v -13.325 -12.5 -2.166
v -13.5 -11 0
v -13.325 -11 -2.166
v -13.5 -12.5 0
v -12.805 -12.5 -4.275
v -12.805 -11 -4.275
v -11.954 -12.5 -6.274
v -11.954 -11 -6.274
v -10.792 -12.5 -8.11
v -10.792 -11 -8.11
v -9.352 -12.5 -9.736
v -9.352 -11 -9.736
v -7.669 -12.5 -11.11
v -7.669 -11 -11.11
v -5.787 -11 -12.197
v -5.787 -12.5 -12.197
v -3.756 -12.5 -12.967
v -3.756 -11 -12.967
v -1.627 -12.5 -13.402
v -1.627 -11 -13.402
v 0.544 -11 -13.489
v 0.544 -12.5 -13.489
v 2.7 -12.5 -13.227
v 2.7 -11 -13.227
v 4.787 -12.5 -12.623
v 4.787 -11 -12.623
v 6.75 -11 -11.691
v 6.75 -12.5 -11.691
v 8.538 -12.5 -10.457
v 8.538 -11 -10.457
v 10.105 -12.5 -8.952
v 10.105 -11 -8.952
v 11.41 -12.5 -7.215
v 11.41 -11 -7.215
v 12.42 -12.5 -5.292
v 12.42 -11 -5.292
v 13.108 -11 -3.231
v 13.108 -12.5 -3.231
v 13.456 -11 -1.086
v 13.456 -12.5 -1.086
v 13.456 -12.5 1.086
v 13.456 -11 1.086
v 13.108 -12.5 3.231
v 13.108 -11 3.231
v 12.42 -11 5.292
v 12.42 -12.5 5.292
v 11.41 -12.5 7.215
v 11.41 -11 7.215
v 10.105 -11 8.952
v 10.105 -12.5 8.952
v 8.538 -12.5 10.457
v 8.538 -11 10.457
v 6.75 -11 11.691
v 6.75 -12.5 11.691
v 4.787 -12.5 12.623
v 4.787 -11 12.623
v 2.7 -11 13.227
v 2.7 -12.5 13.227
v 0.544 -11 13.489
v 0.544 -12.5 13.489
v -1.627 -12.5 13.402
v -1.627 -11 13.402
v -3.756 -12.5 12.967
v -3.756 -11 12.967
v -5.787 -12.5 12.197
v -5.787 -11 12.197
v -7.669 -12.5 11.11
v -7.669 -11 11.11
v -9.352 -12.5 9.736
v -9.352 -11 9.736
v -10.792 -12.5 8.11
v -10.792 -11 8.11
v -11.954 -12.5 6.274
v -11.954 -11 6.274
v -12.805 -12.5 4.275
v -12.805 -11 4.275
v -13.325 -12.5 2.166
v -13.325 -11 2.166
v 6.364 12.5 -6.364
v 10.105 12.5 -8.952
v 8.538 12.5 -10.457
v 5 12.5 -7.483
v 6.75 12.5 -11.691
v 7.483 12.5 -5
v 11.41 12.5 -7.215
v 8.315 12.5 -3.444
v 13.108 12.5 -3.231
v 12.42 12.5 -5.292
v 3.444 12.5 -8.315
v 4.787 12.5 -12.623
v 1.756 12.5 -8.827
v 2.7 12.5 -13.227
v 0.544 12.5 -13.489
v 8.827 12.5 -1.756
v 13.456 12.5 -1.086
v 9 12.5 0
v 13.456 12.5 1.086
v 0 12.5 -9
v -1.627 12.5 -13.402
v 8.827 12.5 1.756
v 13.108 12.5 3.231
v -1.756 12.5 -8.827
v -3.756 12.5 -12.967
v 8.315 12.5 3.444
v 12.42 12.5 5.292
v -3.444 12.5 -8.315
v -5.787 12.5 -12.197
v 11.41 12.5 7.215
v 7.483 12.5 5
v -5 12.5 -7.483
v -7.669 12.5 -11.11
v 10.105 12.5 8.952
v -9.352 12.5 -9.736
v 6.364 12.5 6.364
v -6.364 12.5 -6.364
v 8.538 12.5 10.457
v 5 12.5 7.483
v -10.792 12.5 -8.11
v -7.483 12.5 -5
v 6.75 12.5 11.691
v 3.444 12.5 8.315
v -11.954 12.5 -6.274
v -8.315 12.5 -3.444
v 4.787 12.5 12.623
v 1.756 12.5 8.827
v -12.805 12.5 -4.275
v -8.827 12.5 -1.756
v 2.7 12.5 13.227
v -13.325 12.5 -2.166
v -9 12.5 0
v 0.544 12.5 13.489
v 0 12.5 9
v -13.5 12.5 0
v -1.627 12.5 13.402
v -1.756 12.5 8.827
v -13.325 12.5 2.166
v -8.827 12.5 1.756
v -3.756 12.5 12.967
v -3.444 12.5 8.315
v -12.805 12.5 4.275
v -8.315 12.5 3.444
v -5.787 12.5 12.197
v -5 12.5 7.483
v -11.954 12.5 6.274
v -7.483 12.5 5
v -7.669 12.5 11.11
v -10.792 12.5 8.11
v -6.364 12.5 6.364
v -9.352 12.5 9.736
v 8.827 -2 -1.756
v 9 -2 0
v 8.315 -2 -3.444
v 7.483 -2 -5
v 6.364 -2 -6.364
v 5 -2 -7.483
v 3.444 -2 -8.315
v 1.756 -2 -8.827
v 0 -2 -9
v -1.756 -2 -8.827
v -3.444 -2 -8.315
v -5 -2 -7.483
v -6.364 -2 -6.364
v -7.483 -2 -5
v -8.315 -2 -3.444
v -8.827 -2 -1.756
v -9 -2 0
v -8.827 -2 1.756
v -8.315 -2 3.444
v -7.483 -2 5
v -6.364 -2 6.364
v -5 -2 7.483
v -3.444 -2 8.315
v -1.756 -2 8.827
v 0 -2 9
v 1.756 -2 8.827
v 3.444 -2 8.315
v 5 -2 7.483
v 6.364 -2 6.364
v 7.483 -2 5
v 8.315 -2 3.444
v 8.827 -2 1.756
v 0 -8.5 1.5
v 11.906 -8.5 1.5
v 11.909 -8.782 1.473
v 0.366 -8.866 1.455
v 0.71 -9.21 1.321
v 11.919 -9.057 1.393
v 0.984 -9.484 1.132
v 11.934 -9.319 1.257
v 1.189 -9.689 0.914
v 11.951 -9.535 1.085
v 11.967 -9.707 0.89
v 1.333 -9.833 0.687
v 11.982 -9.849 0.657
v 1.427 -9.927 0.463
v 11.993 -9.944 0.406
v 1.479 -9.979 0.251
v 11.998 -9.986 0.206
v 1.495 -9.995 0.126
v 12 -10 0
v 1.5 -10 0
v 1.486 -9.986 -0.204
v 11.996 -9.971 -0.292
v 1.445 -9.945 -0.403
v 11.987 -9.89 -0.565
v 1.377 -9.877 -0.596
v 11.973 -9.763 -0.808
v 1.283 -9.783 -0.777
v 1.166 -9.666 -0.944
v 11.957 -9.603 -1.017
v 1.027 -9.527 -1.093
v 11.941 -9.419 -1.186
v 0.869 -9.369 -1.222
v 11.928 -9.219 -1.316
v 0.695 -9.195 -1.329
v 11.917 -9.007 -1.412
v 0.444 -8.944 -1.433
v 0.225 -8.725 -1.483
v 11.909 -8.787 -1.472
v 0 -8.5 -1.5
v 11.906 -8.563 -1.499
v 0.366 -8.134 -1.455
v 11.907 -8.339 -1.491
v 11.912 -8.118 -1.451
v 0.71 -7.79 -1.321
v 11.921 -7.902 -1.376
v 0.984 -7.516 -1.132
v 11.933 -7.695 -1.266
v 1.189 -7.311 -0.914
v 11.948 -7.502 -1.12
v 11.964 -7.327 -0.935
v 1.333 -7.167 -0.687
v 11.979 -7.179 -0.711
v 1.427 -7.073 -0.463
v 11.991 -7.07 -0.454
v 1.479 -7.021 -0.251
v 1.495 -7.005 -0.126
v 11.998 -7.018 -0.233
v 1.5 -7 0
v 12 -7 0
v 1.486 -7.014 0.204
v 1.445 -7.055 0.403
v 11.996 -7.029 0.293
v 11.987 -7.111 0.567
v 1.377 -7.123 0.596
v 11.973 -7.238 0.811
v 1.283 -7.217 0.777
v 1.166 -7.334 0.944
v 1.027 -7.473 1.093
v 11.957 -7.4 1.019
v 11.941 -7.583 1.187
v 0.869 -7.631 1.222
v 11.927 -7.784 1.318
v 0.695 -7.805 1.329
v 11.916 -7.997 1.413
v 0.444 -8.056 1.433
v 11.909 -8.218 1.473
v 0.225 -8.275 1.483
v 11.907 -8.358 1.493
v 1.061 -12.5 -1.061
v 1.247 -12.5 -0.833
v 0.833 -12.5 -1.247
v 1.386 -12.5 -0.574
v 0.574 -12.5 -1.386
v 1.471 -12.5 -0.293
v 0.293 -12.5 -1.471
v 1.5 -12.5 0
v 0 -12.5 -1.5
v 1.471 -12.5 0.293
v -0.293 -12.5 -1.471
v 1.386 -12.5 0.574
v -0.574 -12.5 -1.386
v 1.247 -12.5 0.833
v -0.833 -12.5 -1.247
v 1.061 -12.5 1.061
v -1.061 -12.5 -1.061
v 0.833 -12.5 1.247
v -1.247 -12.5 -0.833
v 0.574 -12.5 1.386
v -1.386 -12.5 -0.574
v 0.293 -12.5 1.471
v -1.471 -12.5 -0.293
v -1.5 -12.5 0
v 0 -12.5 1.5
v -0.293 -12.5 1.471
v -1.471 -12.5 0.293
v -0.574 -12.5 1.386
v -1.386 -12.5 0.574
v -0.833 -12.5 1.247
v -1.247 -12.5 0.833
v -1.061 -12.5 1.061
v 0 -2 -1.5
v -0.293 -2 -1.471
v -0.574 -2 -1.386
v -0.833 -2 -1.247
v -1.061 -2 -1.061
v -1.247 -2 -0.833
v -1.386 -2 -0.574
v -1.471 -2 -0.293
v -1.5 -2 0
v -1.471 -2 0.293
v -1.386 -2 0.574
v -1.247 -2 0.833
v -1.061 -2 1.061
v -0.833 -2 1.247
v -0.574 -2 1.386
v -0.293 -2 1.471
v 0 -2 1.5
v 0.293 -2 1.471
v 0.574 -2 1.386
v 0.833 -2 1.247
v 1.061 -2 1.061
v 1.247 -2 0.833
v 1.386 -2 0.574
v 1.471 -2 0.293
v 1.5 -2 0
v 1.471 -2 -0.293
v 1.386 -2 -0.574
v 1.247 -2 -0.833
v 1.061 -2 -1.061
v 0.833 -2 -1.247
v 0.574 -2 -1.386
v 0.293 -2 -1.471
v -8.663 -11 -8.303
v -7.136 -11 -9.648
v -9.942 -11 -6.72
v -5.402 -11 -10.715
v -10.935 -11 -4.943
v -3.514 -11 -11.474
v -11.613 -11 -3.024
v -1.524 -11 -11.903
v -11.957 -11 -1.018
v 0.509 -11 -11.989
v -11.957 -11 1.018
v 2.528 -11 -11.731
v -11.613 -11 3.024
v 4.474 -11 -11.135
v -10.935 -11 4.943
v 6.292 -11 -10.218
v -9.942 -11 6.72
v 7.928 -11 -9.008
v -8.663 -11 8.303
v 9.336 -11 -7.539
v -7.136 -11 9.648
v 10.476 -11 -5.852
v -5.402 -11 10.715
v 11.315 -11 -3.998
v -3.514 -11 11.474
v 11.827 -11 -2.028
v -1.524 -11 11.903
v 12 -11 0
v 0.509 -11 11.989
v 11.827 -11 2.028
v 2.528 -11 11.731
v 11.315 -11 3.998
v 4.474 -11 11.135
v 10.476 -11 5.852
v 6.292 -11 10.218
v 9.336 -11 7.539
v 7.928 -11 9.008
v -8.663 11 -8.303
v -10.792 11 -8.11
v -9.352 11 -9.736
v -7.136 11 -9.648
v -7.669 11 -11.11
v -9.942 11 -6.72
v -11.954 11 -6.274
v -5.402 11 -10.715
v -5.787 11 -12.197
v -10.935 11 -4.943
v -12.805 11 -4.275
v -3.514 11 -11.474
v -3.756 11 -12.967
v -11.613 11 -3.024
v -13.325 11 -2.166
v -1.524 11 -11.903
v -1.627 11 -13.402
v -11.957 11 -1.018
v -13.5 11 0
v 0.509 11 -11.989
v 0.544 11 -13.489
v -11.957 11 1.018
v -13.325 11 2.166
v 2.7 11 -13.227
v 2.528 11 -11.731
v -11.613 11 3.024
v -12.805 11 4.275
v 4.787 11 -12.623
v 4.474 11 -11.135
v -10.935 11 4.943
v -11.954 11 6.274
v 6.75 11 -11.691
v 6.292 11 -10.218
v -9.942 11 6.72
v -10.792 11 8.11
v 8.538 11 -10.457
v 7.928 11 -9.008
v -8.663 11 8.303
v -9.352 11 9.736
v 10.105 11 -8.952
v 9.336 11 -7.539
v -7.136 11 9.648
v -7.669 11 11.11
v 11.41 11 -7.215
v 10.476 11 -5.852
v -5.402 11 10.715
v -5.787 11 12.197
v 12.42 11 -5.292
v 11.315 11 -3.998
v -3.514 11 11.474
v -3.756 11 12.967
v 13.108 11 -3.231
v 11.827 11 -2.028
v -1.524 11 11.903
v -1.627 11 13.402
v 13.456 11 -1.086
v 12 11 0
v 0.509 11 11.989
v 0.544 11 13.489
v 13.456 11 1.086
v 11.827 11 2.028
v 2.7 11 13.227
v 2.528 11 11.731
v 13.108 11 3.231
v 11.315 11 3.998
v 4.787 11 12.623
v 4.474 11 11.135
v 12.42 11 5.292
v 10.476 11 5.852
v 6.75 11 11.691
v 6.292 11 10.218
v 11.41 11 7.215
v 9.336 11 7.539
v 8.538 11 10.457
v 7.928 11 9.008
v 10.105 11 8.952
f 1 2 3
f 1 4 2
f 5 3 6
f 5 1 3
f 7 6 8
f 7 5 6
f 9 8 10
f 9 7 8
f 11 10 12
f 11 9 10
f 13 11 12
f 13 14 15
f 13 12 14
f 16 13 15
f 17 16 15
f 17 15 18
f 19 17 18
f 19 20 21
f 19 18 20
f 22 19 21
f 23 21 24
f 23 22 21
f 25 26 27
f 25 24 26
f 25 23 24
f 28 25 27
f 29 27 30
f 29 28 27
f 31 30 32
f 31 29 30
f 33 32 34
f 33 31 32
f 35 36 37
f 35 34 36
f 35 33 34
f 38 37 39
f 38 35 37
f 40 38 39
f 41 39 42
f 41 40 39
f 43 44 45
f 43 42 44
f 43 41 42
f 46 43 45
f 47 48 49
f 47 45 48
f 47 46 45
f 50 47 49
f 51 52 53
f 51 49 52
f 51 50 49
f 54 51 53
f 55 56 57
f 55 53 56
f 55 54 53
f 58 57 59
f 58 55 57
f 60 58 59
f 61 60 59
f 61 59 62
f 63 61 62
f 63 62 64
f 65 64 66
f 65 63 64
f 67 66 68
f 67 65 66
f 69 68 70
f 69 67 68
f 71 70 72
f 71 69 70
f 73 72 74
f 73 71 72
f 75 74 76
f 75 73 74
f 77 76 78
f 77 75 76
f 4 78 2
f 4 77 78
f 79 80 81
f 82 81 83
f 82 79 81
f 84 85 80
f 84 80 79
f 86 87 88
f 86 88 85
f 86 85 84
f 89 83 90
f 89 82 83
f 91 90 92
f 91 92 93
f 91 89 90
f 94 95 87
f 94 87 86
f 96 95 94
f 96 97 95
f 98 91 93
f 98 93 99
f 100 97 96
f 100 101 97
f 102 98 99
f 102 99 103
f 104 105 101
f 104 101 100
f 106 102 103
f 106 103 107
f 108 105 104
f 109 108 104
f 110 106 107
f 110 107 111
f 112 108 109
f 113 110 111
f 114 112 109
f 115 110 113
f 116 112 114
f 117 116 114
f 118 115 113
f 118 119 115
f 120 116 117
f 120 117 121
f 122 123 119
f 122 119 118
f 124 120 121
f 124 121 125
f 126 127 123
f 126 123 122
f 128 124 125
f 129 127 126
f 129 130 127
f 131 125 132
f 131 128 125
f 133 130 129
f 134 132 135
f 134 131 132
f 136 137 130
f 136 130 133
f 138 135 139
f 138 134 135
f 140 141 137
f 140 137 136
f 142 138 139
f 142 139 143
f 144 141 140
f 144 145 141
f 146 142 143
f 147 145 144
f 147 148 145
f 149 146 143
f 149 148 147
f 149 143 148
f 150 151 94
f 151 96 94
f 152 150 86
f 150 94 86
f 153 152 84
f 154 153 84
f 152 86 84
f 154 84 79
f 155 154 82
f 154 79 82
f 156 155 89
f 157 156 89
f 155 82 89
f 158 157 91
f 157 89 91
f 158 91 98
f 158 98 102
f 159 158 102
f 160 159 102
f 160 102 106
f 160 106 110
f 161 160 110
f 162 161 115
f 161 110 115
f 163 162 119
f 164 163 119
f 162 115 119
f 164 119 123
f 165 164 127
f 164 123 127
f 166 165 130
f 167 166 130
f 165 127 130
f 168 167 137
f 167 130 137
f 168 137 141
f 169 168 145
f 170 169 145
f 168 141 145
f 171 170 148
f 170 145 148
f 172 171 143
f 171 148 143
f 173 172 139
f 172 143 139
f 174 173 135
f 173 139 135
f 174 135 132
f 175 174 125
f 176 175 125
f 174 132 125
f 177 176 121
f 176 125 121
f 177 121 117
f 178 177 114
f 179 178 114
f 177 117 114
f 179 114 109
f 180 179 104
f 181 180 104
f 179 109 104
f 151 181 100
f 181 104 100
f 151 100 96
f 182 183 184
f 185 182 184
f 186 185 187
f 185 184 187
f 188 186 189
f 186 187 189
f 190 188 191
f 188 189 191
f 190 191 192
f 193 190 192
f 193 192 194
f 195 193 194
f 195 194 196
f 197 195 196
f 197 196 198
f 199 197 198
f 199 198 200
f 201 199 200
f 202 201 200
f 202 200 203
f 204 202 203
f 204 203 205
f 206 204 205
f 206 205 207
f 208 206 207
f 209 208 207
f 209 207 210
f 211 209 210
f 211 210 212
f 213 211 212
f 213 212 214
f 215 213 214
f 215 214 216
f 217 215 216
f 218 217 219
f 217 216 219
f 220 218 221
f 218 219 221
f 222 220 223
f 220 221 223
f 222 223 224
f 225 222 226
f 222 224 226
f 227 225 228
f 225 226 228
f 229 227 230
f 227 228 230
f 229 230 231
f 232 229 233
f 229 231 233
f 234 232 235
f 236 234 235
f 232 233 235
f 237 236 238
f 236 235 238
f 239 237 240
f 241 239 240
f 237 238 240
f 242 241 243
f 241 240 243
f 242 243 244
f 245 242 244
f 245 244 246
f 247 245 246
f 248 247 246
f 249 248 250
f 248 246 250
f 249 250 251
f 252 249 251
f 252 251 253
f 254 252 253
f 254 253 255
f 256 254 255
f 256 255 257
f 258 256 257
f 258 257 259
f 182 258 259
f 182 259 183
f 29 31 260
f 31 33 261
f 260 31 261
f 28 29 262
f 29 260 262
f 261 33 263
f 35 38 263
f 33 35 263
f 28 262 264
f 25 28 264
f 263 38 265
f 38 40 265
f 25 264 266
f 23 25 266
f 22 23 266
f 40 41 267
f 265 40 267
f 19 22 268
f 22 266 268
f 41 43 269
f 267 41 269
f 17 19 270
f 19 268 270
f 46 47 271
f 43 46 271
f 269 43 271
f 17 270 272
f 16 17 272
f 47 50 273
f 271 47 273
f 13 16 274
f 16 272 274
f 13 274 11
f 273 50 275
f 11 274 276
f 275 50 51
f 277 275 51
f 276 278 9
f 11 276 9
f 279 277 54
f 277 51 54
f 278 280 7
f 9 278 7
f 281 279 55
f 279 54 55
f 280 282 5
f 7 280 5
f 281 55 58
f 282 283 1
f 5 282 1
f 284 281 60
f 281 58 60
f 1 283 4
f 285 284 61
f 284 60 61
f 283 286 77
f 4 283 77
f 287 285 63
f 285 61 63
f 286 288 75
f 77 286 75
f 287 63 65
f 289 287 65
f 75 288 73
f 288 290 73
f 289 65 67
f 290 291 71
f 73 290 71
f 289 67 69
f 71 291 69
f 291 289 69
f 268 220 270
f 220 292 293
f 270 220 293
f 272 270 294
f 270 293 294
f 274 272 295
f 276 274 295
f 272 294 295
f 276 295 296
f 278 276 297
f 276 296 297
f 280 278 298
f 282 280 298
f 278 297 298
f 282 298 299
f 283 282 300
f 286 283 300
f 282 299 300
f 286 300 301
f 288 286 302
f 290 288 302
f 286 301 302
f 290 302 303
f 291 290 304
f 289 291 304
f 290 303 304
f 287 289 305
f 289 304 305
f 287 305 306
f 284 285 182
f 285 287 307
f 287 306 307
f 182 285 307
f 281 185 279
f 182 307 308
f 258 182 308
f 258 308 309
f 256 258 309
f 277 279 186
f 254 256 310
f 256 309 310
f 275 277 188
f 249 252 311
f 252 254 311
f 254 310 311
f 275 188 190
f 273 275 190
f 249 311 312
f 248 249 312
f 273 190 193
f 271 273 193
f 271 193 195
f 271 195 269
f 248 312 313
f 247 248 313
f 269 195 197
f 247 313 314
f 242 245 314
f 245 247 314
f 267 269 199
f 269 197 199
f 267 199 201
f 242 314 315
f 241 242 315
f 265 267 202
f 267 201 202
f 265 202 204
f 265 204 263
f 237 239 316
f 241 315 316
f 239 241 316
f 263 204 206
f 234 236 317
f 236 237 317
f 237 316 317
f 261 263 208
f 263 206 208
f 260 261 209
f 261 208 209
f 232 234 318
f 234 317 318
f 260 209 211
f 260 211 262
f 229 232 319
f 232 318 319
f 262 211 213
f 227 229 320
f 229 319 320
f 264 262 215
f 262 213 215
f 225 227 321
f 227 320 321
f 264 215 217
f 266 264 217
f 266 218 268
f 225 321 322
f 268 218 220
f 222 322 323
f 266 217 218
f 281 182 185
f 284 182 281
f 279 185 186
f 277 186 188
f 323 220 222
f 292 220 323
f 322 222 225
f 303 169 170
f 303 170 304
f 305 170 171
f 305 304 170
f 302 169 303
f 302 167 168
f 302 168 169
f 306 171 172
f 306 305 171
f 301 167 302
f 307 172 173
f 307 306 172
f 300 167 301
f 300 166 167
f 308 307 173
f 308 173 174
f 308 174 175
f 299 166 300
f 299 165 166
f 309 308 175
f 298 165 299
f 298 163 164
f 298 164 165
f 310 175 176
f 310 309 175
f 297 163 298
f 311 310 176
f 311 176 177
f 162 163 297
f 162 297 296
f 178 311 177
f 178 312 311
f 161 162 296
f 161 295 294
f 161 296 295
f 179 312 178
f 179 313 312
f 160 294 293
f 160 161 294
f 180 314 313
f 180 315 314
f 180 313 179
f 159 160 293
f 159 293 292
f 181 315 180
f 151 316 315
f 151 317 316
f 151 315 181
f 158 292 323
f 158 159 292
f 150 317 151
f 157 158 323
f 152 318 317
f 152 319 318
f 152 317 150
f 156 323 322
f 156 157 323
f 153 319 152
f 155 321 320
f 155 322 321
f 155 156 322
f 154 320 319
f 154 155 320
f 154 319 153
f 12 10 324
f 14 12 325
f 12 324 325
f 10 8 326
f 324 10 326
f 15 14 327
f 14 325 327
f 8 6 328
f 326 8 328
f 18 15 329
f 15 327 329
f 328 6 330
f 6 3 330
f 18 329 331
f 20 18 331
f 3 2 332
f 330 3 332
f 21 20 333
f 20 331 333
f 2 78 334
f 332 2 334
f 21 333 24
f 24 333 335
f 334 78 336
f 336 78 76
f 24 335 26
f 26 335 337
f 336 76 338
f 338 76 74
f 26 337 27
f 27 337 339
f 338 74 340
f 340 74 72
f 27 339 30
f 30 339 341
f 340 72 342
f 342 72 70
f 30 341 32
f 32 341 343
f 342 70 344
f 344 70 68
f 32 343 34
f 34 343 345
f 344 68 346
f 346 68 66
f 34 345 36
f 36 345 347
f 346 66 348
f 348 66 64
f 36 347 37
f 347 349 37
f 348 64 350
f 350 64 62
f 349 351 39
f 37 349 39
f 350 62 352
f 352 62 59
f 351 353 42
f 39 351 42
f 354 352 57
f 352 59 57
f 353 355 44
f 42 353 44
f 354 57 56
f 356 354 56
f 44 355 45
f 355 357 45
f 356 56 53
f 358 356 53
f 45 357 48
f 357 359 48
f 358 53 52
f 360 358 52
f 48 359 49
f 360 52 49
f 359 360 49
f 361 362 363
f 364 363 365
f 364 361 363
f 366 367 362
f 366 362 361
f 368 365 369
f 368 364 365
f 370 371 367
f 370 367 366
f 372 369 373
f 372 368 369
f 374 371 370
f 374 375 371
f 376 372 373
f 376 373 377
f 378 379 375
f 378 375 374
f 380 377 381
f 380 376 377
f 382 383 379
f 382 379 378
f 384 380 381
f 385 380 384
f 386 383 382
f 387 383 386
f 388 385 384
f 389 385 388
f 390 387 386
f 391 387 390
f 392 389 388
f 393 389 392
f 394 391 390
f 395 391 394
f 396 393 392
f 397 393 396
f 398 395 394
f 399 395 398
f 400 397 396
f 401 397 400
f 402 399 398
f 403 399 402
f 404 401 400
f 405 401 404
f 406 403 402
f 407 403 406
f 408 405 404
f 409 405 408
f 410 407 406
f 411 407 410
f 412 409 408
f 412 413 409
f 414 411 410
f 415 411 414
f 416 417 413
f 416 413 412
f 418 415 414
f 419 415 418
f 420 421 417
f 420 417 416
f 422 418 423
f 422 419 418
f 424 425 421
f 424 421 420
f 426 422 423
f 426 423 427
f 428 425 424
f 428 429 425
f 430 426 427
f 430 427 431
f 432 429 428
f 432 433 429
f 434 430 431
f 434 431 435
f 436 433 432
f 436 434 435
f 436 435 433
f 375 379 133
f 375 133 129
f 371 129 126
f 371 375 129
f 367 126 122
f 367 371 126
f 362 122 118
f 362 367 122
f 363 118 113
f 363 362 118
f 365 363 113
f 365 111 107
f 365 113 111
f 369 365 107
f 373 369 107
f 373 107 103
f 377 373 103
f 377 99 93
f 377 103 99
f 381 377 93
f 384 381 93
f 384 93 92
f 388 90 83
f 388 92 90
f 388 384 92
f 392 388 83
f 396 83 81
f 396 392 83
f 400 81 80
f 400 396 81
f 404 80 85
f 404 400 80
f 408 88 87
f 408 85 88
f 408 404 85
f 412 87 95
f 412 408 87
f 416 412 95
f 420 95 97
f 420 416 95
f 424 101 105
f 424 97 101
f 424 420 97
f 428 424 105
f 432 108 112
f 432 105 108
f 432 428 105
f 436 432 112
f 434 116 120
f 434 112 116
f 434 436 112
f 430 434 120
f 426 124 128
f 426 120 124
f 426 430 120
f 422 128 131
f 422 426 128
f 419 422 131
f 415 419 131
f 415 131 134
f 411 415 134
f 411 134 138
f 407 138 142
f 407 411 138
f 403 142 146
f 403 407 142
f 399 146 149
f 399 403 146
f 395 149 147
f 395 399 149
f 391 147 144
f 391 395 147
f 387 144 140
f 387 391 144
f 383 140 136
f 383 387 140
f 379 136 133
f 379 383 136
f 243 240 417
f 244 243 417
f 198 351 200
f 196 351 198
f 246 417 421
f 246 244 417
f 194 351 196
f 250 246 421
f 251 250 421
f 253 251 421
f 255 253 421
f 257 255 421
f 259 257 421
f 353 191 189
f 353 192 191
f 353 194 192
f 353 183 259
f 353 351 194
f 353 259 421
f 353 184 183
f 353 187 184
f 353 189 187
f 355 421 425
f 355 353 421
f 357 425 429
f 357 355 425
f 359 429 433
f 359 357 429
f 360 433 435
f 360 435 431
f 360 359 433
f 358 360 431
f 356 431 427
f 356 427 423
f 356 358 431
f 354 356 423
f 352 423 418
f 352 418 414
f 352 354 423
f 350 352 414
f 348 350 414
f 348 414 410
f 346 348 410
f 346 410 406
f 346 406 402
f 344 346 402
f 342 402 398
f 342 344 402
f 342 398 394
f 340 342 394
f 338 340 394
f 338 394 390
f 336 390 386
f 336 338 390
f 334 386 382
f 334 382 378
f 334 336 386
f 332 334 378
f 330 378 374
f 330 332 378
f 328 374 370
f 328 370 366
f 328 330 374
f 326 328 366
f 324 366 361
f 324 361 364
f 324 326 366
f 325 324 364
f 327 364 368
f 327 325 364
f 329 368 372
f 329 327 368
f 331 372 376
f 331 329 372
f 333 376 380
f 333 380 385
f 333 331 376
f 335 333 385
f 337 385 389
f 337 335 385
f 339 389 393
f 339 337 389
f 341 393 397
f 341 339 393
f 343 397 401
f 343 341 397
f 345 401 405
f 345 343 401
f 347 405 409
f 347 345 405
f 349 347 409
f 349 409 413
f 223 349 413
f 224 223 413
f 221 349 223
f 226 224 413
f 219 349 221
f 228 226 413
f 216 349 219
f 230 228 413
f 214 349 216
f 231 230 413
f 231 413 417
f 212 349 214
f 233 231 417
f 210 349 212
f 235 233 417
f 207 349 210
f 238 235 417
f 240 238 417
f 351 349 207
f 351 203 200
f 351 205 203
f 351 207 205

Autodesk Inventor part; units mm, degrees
ref_plane "YZ Plane" through (0, 0, 0) normal (1, 0, 0) x (0, 1, 0)
ref_plane "XZ Plane" through (0, 0, 0) normal (0, 1, 0) x (-1, 0, 0)
ref_plane "XY Plane" through (0, 0, 0) normal (0, 0, 1) x (1, 0, 0)
sketch "Náčrt1" plane through (0, 0, 0) normal (0, 1, 0) x (-1, 0, 0)
  circle A0 centre (0, 0) radius 16.5
  circle A1 centre (0, 0) radius 13.5
  dimension "d0" = 33
  dimension "d1" = 27
extrude "Vysunutí1" add sketch "Náčrt1" along normal mid plane 25 contours A1
sketch "Náčrt4" plane through (0, 0, 0) normal (1, 0, 0) x (0, 1, 0)
  line L0 (-12.5, 13.5) -> (-12.5, -13.5) projected
  point P0 (0, 0)
  point P1 (-8.5, 0)
  dimension "d16" = 4
hole "Díra2" at (0, -8.5, 0) direction (1, 0, 0) diameter 3 end through all
thread "Závit1" size "M3x0.5" class "6H" standard "ISO Metric profile" full length
extrude "Vysunutí2" add sketch "Náčrt1" along normal mid plane 22
sketch "Náčrt2" plane through (0, 12.5, 0) normal (0, 1, 0) x (1, 0, 0)
  circle A0 centre (0, 0) radius 9
  dimension "d6" = 18
extrude "Vysunutí3" cut sketch "Náčrt2" against normal blind 14.5
sketch "Náčrt3" plane through (0, -12.5, 0) normal (0, -1, 0) x (1, 0, 0)
  circle A0 centre (0, 0) radius 13.5 projected
hole "Díra1" at (0, -12.5, 0) direction (0, 1, 0) diameter 3 end through all
sketch "Náčrt5" plane through (0, -11, 0) normal (0, -1, 0) x (1, 0, 0)
  circle A0 centre (0, 0) radius 16.5 projected
  circle A1 centre (0, 0) radius 12
  dimension "d26" = 24
extrude "Vysunutí4" cut sketch "Náčrt5" against normal up to surface (22 mm away)
properties part number "JSUMO_Wheel_33x25mm_NoSilicon"
